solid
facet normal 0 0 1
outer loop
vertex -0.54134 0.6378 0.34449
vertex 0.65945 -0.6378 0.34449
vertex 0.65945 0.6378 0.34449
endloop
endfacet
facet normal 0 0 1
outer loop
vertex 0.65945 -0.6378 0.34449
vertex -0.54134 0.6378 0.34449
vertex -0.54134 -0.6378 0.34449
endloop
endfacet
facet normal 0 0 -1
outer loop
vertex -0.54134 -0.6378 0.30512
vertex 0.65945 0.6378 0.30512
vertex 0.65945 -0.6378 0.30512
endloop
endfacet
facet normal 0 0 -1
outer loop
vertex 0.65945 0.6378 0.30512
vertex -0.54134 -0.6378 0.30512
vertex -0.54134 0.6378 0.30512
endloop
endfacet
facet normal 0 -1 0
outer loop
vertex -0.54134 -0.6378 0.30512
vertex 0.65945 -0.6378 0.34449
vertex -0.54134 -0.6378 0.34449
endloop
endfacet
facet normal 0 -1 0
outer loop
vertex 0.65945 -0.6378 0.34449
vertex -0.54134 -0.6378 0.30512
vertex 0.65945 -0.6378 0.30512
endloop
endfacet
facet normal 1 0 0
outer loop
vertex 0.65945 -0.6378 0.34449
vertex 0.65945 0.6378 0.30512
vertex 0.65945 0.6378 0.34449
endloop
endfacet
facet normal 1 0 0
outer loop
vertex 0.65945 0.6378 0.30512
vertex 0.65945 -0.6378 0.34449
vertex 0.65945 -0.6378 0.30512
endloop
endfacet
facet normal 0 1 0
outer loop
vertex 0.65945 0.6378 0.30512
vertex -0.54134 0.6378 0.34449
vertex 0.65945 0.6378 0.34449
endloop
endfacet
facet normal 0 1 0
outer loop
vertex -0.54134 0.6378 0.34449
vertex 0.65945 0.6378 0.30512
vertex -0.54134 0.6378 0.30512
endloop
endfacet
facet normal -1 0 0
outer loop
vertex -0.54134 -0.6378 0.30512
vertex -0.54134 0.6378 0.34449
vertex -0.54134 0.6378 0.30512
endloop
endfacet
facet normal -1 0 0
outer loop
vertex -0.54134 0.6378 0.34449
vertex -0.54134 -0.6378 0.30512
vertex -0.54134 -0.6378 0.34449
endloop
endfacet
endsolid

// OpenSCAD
// file: defines.scad
A = 4.55;   // 4.37...4.73
B = 3.24;   // 3.07...3.41
C = 0.875;  // 0.55...1.20
D = 0.6;    // 0.25...0.95
E = 0.45;   // 0.25...0.65

pt = 0.1; // Толщина элеметов (дорожек, краски и т.п)
lab_mark = 0.3; // Полоска

$fn = 32;

scale = 1/2.54;
// main file
include <defines.scad>

scale(scale)
  color([0.0,0.6,0.0])
    translate([-A/2+D+lab_mark, -B/2, C-pt]) cube([A-D-D-lab_mark, B, pt]);
